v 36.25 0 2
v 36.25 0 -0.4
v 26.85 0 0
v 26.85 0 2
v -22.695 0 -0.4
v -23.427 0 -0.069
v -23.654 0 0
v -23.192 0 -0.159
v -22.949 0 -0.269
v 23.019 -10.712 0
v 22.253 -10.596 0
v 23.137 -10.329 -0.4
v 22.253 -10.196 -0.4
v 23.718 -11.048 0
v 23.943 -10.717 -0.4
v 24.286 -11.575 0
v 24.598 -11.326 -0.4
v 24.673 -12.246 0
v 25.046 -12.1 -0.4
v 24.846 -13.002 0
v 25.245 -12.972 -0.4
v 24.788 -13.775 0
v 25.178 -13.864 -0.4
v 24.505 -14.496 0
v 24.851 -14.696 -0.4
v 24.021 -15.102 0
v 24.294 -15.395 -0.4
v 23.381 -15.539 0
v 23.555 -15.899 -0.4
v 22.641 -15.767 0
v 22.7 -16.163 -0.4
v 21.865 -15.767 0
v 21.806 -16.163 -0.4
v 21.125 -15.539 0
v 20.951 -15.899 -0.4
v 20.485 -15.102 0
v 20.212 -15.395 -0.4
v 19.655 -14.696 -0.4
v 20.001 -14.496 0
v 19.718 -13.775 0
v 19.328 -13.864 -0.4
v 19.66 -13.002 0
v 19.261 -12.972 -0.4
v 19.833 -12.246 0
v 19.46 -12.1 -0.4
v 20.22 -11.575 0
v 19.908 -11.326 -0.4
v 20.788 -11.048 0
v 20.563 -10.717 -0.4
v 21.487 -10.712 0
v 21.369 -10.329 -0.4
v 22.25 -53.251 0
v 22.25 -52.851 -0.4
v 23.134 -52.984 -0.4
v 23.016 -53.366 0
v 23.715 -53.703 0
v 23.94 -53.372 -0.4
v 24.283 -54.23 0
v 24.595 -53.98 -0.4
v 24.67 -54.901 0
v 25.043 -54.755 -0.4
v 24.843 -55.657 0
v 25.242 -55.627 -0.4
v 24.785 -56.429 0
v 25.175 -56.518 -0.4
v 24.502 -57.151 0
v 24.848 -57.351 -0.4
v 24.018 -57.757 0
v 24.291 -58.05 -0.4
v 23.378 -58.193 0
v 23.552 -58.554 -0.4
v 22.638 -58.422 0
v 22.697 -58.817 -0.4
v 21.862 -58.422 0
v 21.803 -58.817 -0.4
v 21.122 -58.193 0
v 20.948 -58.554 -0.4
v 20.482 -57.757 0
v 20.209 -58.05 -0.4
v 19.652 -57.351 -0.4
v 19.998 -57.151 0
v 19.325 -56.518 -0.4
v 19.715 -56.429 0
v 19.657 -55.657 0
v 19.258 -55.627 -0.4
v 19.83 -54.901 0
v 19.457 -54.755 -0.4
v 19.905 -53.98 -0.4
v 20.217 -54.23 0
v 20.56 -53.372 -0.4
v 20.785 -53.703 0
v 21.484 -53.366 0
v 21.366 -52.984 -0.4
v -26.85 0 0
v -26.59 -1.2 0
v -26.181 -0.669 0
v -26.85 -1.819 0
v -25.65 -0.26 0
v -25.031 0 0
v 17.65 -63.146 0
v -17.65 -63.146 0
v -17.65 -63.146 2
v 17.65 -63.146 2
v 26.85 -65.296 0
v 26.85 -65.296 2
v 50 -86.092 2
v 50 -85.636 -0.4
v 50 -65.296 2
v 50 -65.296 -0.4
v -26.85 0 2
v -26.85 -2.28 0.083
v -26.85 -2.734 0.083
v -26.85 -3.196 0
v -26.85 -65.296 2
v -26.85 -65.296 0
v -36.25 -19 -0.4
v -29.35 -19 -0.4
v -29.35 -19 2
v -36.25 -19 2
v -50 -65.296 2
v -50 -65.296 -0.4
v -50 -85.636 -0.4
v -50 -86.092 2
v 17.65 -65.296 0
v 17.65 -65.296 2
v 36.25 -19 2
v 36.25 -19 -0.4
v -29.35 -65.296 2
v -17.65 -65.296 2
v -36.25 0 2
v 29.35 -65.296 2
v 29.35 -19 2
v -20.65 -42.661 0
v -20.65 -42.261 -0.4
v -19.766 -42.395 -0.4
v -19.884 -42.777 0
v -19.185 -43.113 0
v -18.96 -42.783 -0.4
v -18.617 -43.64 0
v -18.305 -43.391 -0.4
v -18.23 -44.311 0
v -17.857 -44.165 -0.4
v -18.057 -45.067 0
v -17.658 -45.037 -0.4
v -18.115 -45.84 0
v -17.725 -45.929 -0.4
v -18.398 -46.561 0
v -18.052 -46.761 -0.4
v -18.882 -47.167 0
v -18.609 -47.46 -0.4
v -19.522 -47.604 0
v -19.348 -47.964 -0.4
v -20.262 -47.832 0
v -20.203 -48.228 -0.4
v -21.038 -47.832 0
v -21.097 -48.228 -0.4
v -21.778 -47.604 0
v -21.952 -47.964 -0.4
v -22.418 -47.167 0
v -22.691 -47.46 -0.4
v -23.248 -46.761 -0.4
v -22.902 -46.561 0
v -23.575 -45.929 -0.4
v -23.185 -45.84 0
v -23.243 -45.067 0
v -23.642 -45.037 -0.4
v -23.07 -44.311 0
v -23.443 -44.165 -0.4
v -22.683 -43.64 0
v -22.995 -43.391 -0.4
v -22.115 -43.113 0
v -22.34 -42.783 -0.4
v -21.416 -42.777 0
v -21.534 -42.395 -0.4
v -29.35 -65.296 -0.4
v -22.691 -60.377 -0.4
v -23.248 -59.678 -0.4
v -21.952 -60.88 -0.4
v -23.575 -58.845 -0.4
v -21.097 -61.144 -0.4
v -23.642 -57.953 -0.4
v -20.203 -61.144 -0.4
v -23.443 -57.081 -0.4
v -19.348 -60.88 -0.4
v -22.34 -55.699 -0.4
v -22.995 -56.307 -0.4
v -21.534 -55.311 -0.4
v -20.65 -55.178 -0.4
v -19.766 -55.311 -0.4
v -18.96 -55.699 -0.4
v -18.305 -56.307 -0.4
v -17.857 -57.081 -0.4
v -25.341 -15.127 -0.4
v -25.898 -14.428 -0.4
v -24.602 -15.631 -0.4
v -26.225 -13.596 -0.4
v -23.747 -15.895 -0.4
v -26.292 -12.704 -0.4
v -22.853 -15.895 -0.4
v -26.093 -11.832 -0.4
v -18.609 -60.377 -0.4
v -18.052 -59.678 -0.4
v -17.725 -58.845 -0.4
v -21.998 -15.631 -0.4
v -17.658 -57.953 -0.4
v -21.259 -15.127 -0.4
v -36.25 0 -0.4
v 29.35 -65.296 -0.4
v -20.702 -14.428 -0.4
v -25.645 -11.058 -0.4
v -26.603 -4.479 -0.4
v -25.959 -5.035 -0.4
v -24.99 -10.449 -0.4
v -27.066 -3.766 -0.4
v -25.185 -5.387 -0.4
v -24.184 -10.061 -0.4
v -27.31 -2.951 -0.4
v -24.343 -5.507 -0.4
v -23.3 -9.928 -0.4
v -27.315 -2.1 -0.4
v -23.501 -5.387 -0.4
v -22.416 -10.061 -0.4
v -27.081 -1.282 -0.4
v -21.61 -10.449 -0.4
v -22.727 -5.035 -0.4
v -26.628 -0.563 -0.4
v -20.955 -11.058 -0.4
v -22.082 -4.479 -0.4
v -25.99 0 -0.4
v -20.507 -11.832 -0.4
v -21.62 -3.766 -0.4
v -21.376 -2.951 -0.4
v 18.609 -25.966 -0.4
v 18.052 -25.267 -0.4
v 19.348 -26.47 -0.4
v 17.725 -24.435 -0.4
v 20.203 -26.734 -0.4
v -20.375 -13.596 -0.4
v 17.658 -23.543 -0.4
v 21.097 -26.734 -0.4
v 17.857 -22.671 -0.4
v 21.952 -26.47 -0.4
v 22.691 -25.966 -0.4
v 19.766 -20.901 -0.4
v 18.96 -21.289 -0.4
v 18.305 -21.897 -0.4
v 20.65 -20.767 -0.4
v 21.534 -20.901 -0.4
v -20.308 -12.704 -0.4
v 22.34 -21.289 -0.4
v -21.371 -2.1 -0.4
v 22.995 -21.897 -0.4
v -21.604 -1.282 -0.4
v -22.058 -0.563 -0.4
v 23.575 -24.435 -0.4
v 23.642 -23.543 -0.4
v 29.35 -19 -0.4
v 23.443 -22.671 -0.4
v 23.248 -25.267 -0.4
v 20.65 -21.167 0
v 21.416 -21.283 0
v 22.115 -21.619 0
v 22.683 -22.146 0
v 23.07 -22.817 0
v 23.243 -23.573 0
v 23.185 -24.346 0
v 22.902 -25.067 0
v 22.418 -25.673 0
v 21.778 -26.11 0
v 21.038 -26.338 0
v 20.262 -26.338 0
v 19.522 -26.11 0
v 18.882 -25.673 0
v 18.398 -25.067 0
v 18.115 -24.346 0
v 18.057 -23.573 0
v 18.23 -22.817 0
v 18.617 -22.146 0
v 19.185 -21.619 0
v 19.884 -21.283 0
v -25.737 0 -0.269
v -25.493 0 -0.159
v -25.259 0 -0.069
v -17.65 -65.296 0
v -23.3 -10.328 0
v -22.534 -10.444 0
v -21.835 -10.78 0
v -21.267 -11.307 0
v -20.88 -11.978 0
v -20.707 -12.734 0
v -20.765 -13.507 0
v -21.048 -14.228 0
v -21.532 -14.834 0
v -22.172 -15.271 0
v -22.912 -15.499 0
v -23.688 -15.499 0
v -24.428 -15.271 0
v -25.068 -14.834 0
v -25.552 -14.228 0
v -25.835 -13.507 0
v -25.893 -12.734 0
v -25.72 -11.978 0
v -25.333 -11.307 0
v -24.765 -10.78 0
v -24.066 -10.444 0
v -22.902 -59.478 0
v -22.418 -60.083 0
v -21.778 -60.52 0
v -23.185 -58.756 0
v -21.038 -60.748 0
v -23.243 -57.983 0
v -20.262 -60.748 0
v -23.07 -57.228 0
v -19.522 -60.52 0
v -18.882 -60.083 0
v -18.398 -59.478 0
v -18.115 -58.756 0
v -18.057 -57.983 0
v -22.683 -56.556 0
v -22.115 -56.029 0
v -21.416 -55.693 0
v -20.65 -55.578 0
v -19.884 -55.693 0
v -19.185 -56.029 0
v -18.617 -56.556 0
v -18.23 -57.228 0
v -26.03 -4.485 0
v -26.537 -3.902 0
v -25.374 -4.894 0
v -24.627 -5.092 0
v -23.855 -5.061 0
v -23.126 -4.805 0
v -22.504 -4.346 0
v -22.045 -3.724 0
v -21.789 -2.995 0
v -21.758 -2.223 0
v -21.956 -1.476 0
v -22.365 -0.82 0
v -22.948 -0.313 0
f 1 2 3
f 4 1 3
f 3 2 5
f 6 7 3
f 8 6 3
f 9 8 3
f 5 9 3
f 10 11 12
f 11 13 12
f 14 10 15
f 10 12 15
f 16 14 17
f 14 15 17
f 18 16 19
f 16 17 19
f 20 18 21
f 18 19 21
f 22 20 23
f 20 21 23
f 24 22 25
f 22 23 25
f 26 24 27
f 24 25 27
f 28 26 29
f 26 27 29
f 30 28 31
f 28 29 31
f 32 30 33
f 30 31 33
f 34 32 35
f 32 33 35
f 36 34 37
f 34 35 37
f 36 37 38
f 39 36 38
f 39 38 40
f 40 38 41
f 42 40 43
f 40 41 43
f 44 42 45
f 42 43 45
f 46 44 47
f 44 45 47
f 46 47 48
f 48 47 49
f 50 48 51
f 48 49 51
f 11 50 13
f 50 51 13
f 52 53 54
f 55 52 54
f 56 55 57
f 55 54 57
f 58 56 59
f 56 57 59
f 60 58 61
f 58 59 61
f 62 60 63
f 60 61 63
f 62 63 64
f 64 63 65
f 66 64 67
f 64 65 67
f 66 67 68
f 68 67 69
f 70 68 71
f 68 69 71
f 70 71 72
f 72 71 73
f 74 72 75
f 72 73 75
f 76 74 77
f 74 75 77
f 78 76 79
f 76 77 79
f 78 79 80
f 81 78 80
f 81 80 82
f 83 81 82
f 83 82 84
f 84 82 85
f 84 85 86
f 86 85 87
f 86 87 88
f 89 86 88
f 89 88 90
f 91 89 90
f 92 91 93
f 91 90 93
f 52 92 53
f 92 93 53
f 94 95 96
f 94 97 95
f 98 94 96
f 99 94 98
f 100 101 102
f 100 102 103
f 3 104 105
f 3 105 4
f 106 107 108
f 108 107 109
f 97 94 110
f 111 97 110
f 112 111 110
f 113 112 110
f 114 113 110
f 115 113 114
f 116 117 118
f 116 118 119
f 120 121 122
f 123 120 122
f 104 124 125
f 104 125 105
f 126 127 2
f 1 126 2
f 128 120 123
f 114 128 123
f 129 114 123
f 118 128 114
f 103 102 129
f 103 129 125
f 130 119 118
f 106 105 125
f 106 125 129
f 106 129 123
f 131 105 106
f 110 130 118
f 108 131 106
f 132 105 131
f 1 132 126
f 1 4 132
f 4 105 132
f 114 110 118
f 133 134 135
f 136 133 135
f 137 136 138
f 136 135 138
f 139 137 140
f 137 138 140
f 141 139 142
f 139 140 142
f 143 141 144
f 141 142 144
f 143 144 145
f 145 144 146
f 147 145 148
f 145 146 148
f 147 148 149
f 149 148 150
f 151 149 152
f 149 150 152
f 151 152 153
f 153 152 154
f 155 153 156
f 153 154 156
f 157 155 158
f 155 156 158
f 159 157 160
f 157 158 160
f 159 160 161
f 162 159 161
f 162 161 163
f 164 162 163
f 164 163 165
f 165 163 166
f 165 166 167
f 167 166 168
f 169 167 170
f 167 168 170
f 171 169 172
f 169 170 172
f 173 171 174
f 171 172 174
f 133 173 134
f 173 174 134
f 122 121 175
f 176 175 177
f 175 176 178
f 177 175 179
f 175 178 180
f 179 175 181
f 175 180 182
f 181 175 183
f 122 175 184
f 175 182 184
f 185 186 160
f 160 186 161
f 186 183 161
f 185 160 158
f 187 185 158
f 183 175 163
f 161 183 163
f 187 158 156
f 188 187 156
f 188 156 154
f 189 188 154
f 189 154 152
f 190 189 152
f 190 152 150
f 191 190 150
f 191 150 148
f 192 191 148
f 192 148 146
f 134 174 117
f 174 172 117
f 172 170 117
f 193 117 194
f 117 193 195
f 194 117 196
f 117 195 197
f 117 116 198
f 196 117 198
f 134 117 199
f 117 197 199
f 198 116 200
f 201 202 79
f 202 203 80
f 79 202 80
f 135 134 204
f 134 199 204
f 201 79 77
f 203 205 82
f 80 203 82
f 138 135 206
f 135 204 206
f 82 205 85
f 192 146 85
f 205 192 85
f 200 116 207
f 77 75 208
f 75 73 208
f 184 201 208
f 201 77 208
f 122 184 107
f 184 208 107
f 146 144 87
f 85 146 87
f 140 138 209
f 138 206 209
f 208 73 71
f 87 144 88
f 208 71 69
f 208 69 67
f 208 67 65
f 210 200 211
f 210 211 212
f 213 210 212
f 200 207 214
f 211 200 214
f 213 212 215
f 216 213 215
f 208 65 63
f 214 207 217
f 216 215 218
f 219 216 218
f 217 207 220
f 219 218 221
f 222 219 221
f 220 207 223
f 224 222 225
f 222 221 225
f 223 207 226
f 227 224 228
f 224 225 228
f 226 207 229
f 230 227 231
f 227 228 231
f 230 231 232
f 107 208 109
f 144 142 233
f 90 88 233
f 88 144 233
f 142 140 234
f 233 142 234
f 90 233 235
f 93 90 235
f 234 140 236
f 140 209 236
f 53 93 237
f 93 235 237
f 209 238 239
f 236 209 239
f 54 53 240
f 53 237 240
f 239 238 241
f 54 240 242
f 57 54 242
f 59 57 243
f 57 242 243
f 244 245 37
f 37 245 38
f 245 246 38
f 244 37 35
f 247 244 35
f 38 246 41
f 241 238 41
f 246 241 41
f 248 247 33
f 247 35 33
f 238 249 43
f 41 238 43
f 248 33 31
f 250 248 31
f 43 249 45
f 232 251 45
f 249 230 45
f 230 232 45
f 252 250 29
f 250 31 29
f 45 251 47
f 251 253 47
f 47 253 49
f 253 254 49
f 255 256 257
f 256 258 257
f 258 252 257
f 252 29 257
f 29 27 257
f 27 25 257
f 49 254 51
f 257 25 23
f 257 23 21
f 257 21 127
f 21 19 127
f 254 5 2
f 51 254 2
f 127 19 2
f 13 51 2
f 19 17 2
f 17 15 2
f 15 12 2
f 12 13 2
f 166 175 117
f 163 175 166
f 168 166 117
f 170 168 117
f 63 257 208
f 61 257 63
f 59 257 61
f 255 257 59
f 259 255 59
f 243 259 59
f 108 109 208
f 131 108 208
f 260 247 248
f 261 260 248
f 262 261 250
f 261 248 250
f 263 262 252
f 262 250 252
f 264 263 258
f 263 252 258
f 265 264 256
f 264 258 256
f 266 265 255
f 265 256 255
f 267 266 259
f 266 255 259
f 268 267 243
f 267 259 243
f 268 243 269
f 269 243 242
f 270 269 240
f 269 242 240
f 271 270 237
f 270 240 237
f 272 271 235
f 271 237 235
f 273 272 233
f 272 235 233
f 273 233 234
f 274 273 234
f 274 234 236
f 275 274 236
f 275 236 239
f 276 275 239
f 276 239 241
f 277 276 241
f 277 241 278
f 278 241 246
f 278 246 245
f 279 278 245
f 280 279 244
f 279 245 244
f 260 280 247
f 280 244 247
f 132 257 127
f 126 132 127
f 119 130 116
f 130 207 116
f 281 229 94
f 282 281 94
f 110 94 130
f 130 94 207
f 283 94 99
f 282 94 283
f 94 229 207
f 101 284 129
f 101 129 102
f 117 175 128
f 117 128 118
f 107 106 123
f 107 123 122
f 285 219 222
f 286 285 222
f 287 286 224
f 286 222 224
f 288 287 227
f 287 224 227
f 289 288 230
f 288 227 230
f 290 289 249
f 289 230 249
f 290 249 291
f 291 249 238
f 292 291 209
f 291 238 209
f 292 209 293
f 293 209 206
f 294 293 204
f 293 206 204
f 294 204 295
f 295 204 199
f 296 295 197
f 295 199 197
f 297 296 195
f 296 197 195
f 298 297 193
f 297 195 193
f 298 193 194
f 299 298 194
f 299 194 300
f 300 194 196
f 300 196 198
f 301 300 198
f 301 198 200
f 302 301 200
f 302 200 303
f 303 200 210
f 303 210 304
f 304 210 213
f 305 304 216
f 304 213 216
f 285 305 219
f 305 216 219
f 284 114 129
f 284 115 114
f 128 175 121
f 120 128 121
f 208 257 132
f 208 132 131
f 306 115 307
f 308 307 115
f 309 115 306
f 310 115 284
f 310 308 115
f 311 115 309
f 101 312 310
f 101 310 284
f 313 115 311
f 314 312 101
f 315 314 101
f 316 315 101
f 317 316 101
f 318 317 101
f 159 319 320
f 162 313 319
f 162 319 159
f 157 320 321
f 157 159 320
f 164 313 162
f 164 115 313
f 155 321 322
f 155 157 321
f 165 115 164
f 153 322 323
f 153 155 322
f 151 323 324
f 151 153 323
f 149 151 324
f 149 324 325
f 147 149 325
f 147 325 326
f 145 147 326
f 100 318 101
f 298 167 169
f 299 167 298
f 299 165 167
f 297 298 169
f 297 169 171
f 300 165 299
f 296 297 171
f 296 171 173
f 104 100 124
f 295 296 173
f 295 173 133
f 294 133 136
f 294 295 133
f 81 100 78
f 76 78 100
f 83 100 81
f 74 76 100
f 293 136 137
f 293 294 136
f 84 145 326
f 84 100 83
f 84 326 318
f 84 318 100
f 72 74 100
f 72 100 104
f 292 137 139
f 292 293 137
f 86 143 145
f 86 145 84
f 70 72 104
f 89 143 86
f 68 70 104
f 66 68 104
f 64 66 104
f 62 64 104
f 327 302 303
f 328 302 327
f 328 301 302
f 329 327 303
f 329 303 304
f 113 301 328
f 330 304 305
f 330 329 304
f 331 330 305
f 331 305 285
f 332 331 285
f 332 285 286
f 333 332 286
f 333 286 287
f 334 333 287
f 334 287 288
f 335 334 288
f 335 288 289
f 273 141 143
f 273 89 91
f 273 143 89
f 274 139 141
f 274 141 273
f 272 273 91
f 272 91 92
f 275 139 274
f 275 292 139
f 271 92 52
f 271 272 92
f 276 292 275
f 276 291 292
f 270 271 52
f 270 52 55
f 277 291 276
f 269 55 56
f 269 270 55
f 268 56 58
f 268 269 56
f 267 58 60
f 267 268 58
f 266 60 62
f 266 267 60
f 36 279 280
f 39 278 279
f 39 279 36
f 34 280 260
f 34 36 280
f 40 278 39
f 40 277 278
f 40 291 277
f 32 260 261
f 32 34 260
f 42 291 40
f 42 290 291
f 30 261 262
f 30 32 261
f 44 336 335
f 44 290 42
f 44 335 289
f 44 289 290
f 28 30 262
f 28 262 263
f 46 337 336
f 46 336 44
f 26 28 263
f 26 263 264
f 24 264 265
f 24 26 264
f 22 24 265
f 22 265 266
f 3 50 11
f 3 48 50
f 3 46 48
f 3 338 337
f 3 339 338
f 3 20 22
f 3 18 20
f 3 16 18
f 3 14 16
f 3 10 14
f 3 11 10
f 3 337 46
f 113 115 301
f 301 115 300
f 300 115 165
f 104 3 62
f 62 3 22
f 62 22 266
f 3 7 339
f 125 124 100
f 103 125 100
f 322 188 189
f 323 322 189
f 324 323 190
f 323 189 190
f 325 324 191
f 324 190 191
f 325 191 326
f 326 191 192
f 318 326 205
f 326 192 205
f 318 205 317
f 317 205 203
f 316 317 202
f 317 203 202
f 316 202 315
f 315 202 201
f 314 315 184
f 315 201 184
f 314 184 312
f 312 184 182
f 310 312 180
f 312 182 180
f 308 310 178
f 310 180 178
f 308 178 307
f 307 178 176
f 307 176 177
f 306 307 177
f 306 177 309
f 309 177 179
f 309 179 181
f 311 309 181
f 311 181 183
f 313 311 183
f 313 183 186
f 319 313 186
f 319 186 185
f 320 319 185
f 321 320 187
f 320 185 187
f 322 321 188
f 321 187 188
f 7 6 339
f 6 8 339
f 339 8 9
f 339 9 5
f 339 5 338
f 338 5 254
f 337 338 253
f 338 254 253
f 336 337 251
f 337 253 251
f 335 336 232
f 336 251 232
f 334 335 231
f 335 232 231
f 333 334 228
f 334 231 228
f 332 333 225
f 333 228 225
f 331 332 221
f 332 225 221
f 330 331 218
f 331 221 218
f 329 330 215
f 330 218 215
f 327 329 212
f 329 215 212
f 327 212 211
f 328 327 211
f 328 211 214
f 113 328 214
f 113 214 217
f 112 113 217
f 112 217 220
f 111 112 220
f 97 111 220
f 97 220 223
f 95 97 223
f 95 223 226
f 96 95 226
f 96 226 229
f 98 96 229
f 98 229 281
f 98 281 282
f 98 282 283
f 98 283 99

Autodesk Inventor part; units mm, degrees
ref_plane "YZ Plane" through (0, 0, 0) normal (1, 0, 0) x (0, 1, 0)
ref_plane "XZ Plane" through (0, 0, 0) normal (0, 1, 0) x (-1, 0, 0)
ref_plane "XY Plane" through (0, 0, 0) normal (0, 0, 1) x (1, 0, 0)
sketch "Sketch1" plane through (0, 0, 0) normal (0, 0, 1) x (1, 0, 0)
  line L0 (-14.25, -14.5) -> (13.65, -14.5)
  line L1 (-13.65, -55.2958) -> (14.25, -55.2958)
  line L2 (50, 0) -> (-50, 0)
  line L3 (-50, 0) -> (-50, -90)
  line L4 (-50, -90) -> (50, -90)
  line L5 (50, -90) -> (50, 0)
  line L6 (50, -86.2958) -> (-50, -86.2958)
  line L7 (14.65, -6.65) -> (-15.25, -6.65)
  line L8 (-15.25, -6.65) -> (-15.25, -22.35)
  line L9 (-15.25, -22.35) -> (14.65, -22.35)
  line L10 (14.65, -22.35) -> (14.65, -6.65)
  line L11 (15.25, -47.4458) -> (-14.65, -47.4458)
  line L12 (-14.65, -47.4458) -> (-14.65, -63.1458)
  line L13 (-14.65, -63.1458) -> (15.25, -63.1458)
  line L14 (15.25, -63.1458) -> (15.25, -47.4458)
  line L15 (30.5, -65.2958) -> (29.35, -65.2958)
  line L16 (-30.5, -65.2958) -> (-29.35, -65.2958)
  circle A0 centre (20.65, -24.0677) radius 2.25 projected
  circle A1 centre (22.6692, -56.1259) radius 2.25 projected
  circle A2 centre (22.25, -13.4966) radius 2.25 projected
  line L17 (19.75, -61.0677) -> (19.75, -50.9236) projected
  line L18 (19.75, -50.9236) -> (23.15, -50.9236) projected
  line L19 (23.15, -50.9236) -> (23.15, -46.7261) projected
  line L20 (19.75, -46.7261) -> (23.15, -46.7261) projected
  line L21 (19.75, -46.7261) -> (19.75, -44.8549) projected
  line L22 (19.75, -44.8549) -> (17.65, -44.8549) projected
  line L23 (17.65, 0) -> (17.65, -44.8549) projected
  line L24 (17.65, 0) -> (26.85, 0) projected
  line L25 (26.85, -65.2958) -> (26.85, 0) projected
  line L26 (23.15, -65.2958) -> (26.85, -65.2958) projected
  line L27 (23.15, -65.2958) -> (23.15, -61.0677) projected
  line L28 (19.75, -61.0677) -> (23.15, -61.0677) projected
  circle A3 centre (-24.3428, -2.5072) radius 2.25 projected
  circle A4 centre (-20.65, -57.8419) radius 2.25 projected
  circle A5 centre (-20.65, -44.9257) radius 2.25 projected
  circle A6 centre (-23.3, -12.9282) radius 2.25 projected
  line L29 (-26.85, 0) -> (-17.65, 0) projected
  line L30 (-17.65, -4.0591) -> (-17.65, 0) projected
  line L31 (-19.75, -4.0591) -> (-17.65, -4.0591) projected
  line L32 (-19.75, -4.7124) -> (-19.75, -4.0591) projected
  line L33 (-19.75, -4.7124) -> (-23.15, -4.7124) projected
  line L34 (-23.15, -4.7124) -> (-23.15, -8.7282) projected
  line L35 (-19.75, -8.7282) -> (-23.15, -8.7282) projected
  line L36 (-19.75, -18.8723) -> (-19.75, -8.7282) projected
  line L37 (-19.75, -18.8723) -> (-23.15, -18.8723) projected
  line L38 (-23.15, -18.8723) -> (-23.15, -23.0697) projected
  line L39 (-19.75, -23.0697) -> (-23.15, -23.0697) projected
  line L40 (-19.75, -24.9409) -> (-19.75, -23.0697) projected
  line L41 (-19.75, -24.9409) -> (-17.65, -24.9409) projected
  line L42 (-17.65, -65.2958) -> (-17.65, -24.9409) projected
  line L43 (-26.85, -65.2958) -> (-17.65, -65.2958) projected
  line L44 (-26.85, 0) -> (-26.85, -65.2958) projected
  line L45 (-17.65, -4.0591) -> (-17.65, -24.9409)
  line L46 (23.15, -65.2958) -> (17.65, -65.2958)
  line L47 (17.65, -65.2958) -> (17.65, -44.8549)
  line L48 (17.65, -6.65) -> (-17.65, -6.65)
  line L49 (-17.65, -63.1458) -> (17.65, -63.1458)
  line L50 (-26.85, -65.2958) -> (-26.85, -13) projected
  line L51 (-26.85, -65.2958) -> (-29.35, -65.2958) projected
  line L52 (-29.35, -65.2958) -> (-29.35, -19) projected
  line L53 (-29.35, -19) -> (-36.25, -19) projected
  line L54 (-36.25, -13) -> (-36.25, -19) projected
  line L55 (-26.85, -13) -> (-36.25, -13) projected
  line L56 (26.85, -13) -> (26.85, -65.2958) projected
  line L57 (26.85, -13) -> (36.25, -13) projected
  line L58 (36.25, -19) -> (36.25, -13) projected
  line L59 (29.35, -19) -> (36.25, -19) projected
  line L60 (29.35, -19) -> (29.35, -65.2958) projected
  line L61 (29.35, -65.2958) -> (26.85, -65.2958) projected
  line L62 (-26.85, -3) -> (-26.85, 0) projected
  line L63 (-26.85, -3) -> (-36.25, -3) projected
  line L64 (-36.25, 0) -> (-36.25, -3) projected
  line L65 (-26.85, 0) -> (-36.25, 0) projected
  line L66 (26.85, 0) -> (26.85, -3) projected
  line L67 (26.85, 0) -> (36.25, 0) projected
  line L68 (36.25, -3) -> (36.25, 0) projected
  line L69 (26.85, -3) -> (36.25, -3) projected
  arc A7 (26.85, -66.2958) -> (29.85, -69.2958) centre (29.85, -66.2958) ccw projected
  line L70 (26.85, -65.2958) -> (26.85, -66.2958) projected
  line L71 (26.85, -65.2958) -> (50, -65.2958) projected
  line L72 (50, -65.2958) -> (50, -85.9433) projected
  line L73 (34.5, -85.9433) -> (50, -85.9433) projected
  line L74 (34.5, -78.442) -> (34.5, -85.9433) projected
  line L75 (34.5, -78.442) -> (45.421, -78.442) projected
  arc A8 (45.421, -78.442) -> (46.8031, -78.442) centre (46.112, -80.4779) ccw projected
  line L76 (46.8031, -78.442) -> (49, -78.442) projected
  line L77 (49, -78.442) -> (49, -69.922) projected
  line L78 (49, -69.922) -> (46.525, -69.922) projected
  line L79 (46.525, -69.922) -> (32.6782, -69.3038) projected
  arc A9 (32.6782, -69.3038) -> (32.5, -69.2958) centre (32.5, -71.2958) ccw projected
  line L80 (32.5, -69.2958) -> (29.85, -69.2958) projected
  arc A10 (-29.85, -69.2958) -> (-26.85, -66.2958) centre (-29.85, -66.2958) ccw projected
  line L81 (-32.5, -69.2958) -> (-29.85, -69.2958) projected
  arc A11 (-32.5, -69.2958) -> (-32.6782, -69.3038) centre (-32.5, -71.2958) ccw projected
  line L82 (-32.6782, -69.3038) -> (-46.525, -69.922) projected
  line L83 (-46.525, -69.922) -> (-49, -69.922) projected
  line L84 (-49, -69.922) -> (-49, -78.442) projected
  line L85 (-49, -78.442) -> (-46.8031, -78.442) projected
  arc A12 (-46.8031, -78.442) -> (-45.421, -78.442) centre (-46.112, -80.4779) ccw projected
  line L86 (-45.421, -78.442) -> (-34.5, -78.442) projected
  line L87 (-34.5, -78.442) -> (-34.5, -85.9433) projected
  line L88 (-34.5, -85.9433) -> (-50, -85.9433) projected
  line L89 (-50, -65.2958) -> (-50, -85.9433) projected
  line L90 (-26.85, -65.2958) -> (-50, -65.2958) projected
  line L91 (-26.85, -65.2958) -> (-26.85, -66.2958) projected
  line L92 (36.25, 0) -> (36.25, -19)
  line L93 (-36.25, -19) -> (-36.25, 0)
  point P0 (0, 0)
  point P1 (26.95, 0)
  point P2 (-15.25, -6.65)
  dimension "d0" = 50
  dimension "d1" = 50
  dimension "d2" = 90
  dimension "d3" = 7.85
  dimension "d4" = 7.85
  dimension "d5" = 1
  dimension "d6" = 1
  dimension "d7" = 7.85
  dimension "d8" = 7.85
  dimension "d9" = 1
  dimension "d10" = 1
  dimension "d21" = 0
extrude "Extrusion4" add sketch "Sketch1" along normal blind 2 contours L68 L69 L25 L2 | L5 L73 L74 L75 A8 L76 L77 L78 L79 A9 L80 A7 L70 L61 L15 L71 | L92 L57 L25 L69 | L5 L6 L3 L88 L87 L86 A12 L85 L84 L83 L82 A11 L81 A10 L91 L43 L42 L49 L13 L47 L46 L26 L70 A7 L80 A9 L79 L78 L77 L76 A8 L75 L74 L73 | L58 L59 L60 L61 L25 L57 | L44 L63 L64 L2 | L3 L90 L16 L51 L91 A10 L81 A11 L82 L83 L84 L85 A12 L86 L87 L88 | L44 L55 L93 L63 | L44 L51 L52 L53 L54 L55
extrude "Extrusion5" add sketch "Sketch1" against normal blind 0.4 contours L68 L69 L25 L2 | L5 L73 L74 L75 A8 L76 L77 L78 L79 A9 L80 A7 L70 L61 L15 L71 | L25 L26 L27 L28 L17 L18 L19 L20 L21 L22 L23 L2 | L92 L57 L25 L69 | L5 L6 L3 L88 L87 L86 A12 L85 L84 L83 L82 A11 L81 A10 L91 L43 L42 L49 L13 L47 L46 L26 L70 A7 L80 A9 L79 L78 L77 L76 A8 L75 L74 L73 | L23 L48 L7 L45 L30 L2 | L58 L59 L60 L61 L25 L57 | L30 L31 L32 L33 L34 L35 L36 L37 L38 L39 L40 L41 L42 L43 L44 L2 | L23 L47 L49 L14 L11 L12 L42 L45 L48 L8 L9 L10 | L44 L63 L64 L2 | L45 L41 L40 L39 L38 L37 L36 L35 L34 L33 L32 L31 | L22 L21 L20 L19 L18 L17 L28 L27 L46 L47 | L10 L9 L8 L7 | L3 L90 L16 L51 L91 A10 L81 A11 L82 L83 L84 L85 A12 L86 L87 L88 | L44 L55 L93 L63 | L44 L51 L52 L53 L54 L55 | L13 L12 L11 L14 | A0 | A1 | A2 | A3 | A4 | A5 | A6
sketch "Sketch2" plane through (50, -86.2958, 2) normal (1, 0, 0) x (0, 0, -1)
  line L0 (2.2133, 0.4205) -> (-23.8, -4.5217) projected
  line L1 (-23.8, -4.5217) -> (-23.6133, -5.5042) projected
  line L2 (-23.6133, -5.5042) -> (2.4, -0.5619) projected
  line L3 (2.4, -0.5619) -> (2.2133, 0.4205) projected
  line L4 (0, -10.5619) -> (0, 0.2036)
  line L5 (0, 0.2036) -> (2.4, 0.6596)
  line L6 (2.4, 0.6596) -> (2.4, -10.5619)
  line L7 (2.4, -10.5619) -> (0, -10.5619)
  point P0 (2, 86.2958)
  dimension "d15" = 2.4
  dimension "d16" = 0.2
  dimension "d17" = 0
  dimension "d18" = 10
extrude "Extrusion3" cut sketch "Sketch2" against normal through all contours L3 L2 L4 L0 | L0 L4 L5 L6 L3 | L6 L7 L4 L2
sketch "Sketch3" plane through (0, 0, -0.4) normal (0, 0, -1) x (-1, 0, 0)
  circle A0 centre (24.3428, -2.5072) radius 1.5 projected
  circle A1 centre (23.3, -12.9282) radius 1.5 projected
  circle A2 centre (20.65, -58.1775) radius 1.5 projected
  circle A3 centre (20.65, -45.2613) radius 1.5 projected
  circle A4 centre (-20.65, -23.7673) radius 1.5 projected
  circle A5 centre (-22.25, -55.8509) radius 1.5 projected
  circle A6 centre (-22.253, -13.1962) radius 1.5 projected
  arc A7 (-26.256, -0.1) -> (-26.756, -0.6) centre (-26.256, -0.6) ccw projected
  line L0 (-26.756, -0.6) -> (-26.756, -64.6958) projected
  arc A8 (-26.756, -64.6958) -> (-26.256, -65.1958) centre (-26.256, -64.6958) ccw projected
  line L1 (-26.256, -65.1958) -> (-23.756, -65.1958) projected
  arc A9 (-23.756, -65.1958) -> (-23.256, -64.6958) centre (-23.756, -64.6958) ccw projected
  line L2 (-23.256, -64.6958) -> (-23.256, -61.4677) projected
  arc A10 (-22.756, -60.9677) -> (-23.256, -61.4677) centre (-22.756, -61.4677) ccw projected
  line L3 (-22.756, -60.9677) -> (-20.35, -60.9677) projected
  arc A11 (-20.35, -60.9677) -> (-19.85, -60.4677) centre (-20.35, -60.4677) ccw projected
  line L4 (-19.85, -60.4677) -> (-19.85, -51.8592) projected
  arc A12 (-19.85, -51.8592) -> (-20.35, -51.3592) centre (-20.35, -51.8592) ccw projected
  line L5 (-20.35, -51.3592) -> (-22.756, -51.3592) projected
  arc A13 (-23.256, -50.8592) -> (-22.756, -51.3592) centre (-22.756, -50.8592) ccw projected
  line L6 (-23.256, -50.8592) -> (-23.256, -41.5958) projected
  arc A14 (-22.756, -41.0958) -> (-23.256, -41.5958) centre (-22.756, -41.5958) ccw projected
  line L7 (-22.756, -41.0958) -> (-12.25, -41.0958) projected
  arc A15 (-11.75, -41.5958) -> (-12.25, -41.0958) centre (-12.25, -41.5958) ccw projected
  line L8 (-11.75, -41.5958) -> (-11.75, -43.0958) projected
  arc A16 (-11.75, -43.0958) -> (-11.25, -43.5958) centre (-11.25, -43.0958) ccw projected
  line L9 (-11.25, -43.5958) -> (11.25, -43.5958) projected
  arc A17 (11.25, -43.5958) -> (11.75, -43.0958) centre (11.25, -43.0958) ccw projected
  line L10 (11.75, -43.0958) -> (11.75, -41.5958) projected
  arc A18 (12.25, -41.0958) -> (11.75, -41.5958) centre (12.25, -41.5958) ccw projected
  line L11 (12.25, -41.0958) -> (17.25, -41.0958) projected
  arc A19 (17.75, -41.5958) -> (17.25, -41.0958) centre (17.25, -41.5958) ccw projected
  line L12 (17.75, -41.5958) -> (17.75, -64.6958) projected
  arc A20 (17.75, -64.6958) -> (18.25, -65.1958) centre (18.25, -64.6958) ccw projected
  line L13 (18.25, -65.1958) -> (26.25, -65.1958) projected
  arc A21 (26.25, -65.1958) -> (26.75, -64.6958) centre (26.25, -64.6958) ccw projected
  line L14 (26.75, -64.6958) -> (26.75, -0.6) projected
  arc A22 (26.75, -0.6) -> (26.25, -0.1) centre (26.25, -0.6) ccw projected
  line L15 (26.25, -0.1) -> (18.25, -0.1) projected
  arc A23 (18.25, -0.1) -> (17.75, -0.6) centre (18.25, -0.6) ccw projected
  line L16 (17.75, -0.6) -> (17.75, -3.1235) projected
  arc A24 (17.75, -3.1235) -> (18.25, -3.6235) centre (18.25, -3.1235) ccw projected
  line L17 (18.25, -3.6235) -> (22.75, -3.6235) projected
  arc A25 (23.25, -4.1235) -> (22.75, -3.6235) centre (22.75, -4.1235) ccw projected
  line L18 (23.25, -4.1235) -> (23.25, -8.3282) projected
  arc A26 (22.75, -8.8282) -> (23.25, -8.3282) centre (22.75, -8.3282) ccw projected
  line L19 (22.75, -8.8282) -> (20.35, -8.8282) projected
  arc A27 (20.35, -8.8282) -> (19.85, -9.3282) centre (20.35, -9.3282) ccw projected
  line L20 (19.85, -9.3282) -> (19.85, -17.9366) projected
  arc A28 (19.85, -17.9366) -> (20.35, -18.4366) centre (20.35, -17.9366) ccw projected
  line L21 (20.35, -18.4366) -> (22.75, -18.4366) projected
  arc A29 (23.25, -18.9366) -> (22.75, -18.4366) centre (22.75, -18.9366) ccw projected
  line L22 (23.25, -18.9366) -> (23.25, -28.2) projected
  arc A30 (22.75, -28.7) -> (23.25, -28.2) centre (22.75, -28.2) ccw projected
  line L23 (22.75, -28.7) -> (12.25, -28.7) projected
  arc A31 (11.75, -28.2) -> (12.25, -28.7) centre (12.25, -28.2) ccw projected
  line L24 (11.75, -28.2) -> (11.75, -26.7) projected
  arc A32 (11.75, -26.7) -> (11.25, -26.2) centre (11.25, -26.7) ccw projected
  line L25 (11.25, -26.2) -> (-17.25, -26.2) projected
  arc A33 (-17.75, -25.7) -> (-17.25, -26.2) centre (-17.25, -25.7) ccw projected
  line L26 (-17.75, -25.7) -> (-17.75, -0.6) projected
  arc A34 (-17.75, -0.6) -> (-18.25, -0.1) centre (-18.25, -0.6) ccw projected
  line L27 (-18.25, -0.1) -> (-26.256, -0.1) projected
  line L28 (-29.5, -65.8371) -> (-50, -65.8371) projected
  line L29 (-50, -65.8371) -> (-50, -86.3723) projected
  line L30 (-34.5, -86.3723) -> (-50, -86.3723) projected
  line L31 (-34.5, -78.883) -> (-34.5, -86.3723) projected
  line L32 (-34.5, -78.883) -> (-49, -78.883) projected
  line L33 (-49, -70.278) -> (-33.7527, -70.278) projected
  line L34 (-32.5, -69.8371) -> (-31.5, -69.8371) projected
  line L35 (29.5, -65.8371) -> (50, -65.8371) projected
  line L36 (33.7527, -70.278) -> (49, -70.278) projected
  line L37 (49, -78.883) -> (34.5, -78.883) projected
  circle A35 centre (-47.662, -81.0191) radius 2.15 projected
  circle A36 centre (-46.75, -81.383) radius 1.5 projected
  line L38 (34.5, -78.883) -> (34.5, -86.3723) projected
  line L39 (29.5, -67.8371) -> (29.5, -65.8371) projected
  arc A37 (29.5, -67.8371) -> (31.5, -69.8371) centre (31.5, -67.8371) ccw projected
  line L40 (32.5, -69.8371) -> (31.5, -69.8371) projected
  arc A38 (33.7527, -70.278) -> (32.5, -69.8371) centre (32.5, -71.8371) ccw projected
  arc A39 (-31.5, -69.8371) -> (-29.5, -67.8371) centre (-31.5, -67.8371) ccw projected
  line L41 (-29.5, -67.8371) -> (-29.5, -65.8371) projected
  arc A40 (-32.5, -69.8371) -> (-33.7527, -70.278) centre (-32.5, -71.8371) ccw projected
  line L42 (-49, -78.883) -> (-49, -70.278) projected
  line L43 (49, -70.278) -> (49, -78.883) projected
  line L44 (34.5, -86.3723) -> (50, -86.3723) projected
  line L45 (50, -65.8371) -> (50, -86.3723) projected
  circle A41 centre (46.75, -81.383) radius 1.5 projected
  point P0 (0, 0)
  point P1 (-49, -78.442)
  point P2 (-49, -78.292)
  point P3 (-50, -86.5495)
  point P4 (-34.5, -86.5495)
  point P5 (-50, -66.2871)
  point P6 (-34.5, -78.8554)
  point P7 (-49, -70.3354)
  point P8 (49, -78.2054)
  point P9 (49, -77.792)
  point P10 (36.05, -86.3723)
hole "Hole1" at (22.25, -55.8509, -0.4) at (20.65, -23.7673, -0.4) at (22.253, -13.1962, -0.4) at (-24.3428, -2.5072, -0.4) at (-23.3, -12.9282, -0.4) at (-20.65, -45.2613, -0.4) at (-20.65, -58.1775, -0.4) direction (0, 0, 1) diameter 3.4 depth 10 countersink diameter 6 countersink angle 90 clearance for "Countersunk Flat Head Screw ISO 2009/7046" size "M3" standard "ISO"
equation "\"d4\" = d3"
equation "\"d6\" = d5"
equation "\"d7\" = d3"
equation "\"d8\" = d3"
equation "\"d9\" = d5"
equation "\"d10\" = d5"
properties part number "Ceiling"
